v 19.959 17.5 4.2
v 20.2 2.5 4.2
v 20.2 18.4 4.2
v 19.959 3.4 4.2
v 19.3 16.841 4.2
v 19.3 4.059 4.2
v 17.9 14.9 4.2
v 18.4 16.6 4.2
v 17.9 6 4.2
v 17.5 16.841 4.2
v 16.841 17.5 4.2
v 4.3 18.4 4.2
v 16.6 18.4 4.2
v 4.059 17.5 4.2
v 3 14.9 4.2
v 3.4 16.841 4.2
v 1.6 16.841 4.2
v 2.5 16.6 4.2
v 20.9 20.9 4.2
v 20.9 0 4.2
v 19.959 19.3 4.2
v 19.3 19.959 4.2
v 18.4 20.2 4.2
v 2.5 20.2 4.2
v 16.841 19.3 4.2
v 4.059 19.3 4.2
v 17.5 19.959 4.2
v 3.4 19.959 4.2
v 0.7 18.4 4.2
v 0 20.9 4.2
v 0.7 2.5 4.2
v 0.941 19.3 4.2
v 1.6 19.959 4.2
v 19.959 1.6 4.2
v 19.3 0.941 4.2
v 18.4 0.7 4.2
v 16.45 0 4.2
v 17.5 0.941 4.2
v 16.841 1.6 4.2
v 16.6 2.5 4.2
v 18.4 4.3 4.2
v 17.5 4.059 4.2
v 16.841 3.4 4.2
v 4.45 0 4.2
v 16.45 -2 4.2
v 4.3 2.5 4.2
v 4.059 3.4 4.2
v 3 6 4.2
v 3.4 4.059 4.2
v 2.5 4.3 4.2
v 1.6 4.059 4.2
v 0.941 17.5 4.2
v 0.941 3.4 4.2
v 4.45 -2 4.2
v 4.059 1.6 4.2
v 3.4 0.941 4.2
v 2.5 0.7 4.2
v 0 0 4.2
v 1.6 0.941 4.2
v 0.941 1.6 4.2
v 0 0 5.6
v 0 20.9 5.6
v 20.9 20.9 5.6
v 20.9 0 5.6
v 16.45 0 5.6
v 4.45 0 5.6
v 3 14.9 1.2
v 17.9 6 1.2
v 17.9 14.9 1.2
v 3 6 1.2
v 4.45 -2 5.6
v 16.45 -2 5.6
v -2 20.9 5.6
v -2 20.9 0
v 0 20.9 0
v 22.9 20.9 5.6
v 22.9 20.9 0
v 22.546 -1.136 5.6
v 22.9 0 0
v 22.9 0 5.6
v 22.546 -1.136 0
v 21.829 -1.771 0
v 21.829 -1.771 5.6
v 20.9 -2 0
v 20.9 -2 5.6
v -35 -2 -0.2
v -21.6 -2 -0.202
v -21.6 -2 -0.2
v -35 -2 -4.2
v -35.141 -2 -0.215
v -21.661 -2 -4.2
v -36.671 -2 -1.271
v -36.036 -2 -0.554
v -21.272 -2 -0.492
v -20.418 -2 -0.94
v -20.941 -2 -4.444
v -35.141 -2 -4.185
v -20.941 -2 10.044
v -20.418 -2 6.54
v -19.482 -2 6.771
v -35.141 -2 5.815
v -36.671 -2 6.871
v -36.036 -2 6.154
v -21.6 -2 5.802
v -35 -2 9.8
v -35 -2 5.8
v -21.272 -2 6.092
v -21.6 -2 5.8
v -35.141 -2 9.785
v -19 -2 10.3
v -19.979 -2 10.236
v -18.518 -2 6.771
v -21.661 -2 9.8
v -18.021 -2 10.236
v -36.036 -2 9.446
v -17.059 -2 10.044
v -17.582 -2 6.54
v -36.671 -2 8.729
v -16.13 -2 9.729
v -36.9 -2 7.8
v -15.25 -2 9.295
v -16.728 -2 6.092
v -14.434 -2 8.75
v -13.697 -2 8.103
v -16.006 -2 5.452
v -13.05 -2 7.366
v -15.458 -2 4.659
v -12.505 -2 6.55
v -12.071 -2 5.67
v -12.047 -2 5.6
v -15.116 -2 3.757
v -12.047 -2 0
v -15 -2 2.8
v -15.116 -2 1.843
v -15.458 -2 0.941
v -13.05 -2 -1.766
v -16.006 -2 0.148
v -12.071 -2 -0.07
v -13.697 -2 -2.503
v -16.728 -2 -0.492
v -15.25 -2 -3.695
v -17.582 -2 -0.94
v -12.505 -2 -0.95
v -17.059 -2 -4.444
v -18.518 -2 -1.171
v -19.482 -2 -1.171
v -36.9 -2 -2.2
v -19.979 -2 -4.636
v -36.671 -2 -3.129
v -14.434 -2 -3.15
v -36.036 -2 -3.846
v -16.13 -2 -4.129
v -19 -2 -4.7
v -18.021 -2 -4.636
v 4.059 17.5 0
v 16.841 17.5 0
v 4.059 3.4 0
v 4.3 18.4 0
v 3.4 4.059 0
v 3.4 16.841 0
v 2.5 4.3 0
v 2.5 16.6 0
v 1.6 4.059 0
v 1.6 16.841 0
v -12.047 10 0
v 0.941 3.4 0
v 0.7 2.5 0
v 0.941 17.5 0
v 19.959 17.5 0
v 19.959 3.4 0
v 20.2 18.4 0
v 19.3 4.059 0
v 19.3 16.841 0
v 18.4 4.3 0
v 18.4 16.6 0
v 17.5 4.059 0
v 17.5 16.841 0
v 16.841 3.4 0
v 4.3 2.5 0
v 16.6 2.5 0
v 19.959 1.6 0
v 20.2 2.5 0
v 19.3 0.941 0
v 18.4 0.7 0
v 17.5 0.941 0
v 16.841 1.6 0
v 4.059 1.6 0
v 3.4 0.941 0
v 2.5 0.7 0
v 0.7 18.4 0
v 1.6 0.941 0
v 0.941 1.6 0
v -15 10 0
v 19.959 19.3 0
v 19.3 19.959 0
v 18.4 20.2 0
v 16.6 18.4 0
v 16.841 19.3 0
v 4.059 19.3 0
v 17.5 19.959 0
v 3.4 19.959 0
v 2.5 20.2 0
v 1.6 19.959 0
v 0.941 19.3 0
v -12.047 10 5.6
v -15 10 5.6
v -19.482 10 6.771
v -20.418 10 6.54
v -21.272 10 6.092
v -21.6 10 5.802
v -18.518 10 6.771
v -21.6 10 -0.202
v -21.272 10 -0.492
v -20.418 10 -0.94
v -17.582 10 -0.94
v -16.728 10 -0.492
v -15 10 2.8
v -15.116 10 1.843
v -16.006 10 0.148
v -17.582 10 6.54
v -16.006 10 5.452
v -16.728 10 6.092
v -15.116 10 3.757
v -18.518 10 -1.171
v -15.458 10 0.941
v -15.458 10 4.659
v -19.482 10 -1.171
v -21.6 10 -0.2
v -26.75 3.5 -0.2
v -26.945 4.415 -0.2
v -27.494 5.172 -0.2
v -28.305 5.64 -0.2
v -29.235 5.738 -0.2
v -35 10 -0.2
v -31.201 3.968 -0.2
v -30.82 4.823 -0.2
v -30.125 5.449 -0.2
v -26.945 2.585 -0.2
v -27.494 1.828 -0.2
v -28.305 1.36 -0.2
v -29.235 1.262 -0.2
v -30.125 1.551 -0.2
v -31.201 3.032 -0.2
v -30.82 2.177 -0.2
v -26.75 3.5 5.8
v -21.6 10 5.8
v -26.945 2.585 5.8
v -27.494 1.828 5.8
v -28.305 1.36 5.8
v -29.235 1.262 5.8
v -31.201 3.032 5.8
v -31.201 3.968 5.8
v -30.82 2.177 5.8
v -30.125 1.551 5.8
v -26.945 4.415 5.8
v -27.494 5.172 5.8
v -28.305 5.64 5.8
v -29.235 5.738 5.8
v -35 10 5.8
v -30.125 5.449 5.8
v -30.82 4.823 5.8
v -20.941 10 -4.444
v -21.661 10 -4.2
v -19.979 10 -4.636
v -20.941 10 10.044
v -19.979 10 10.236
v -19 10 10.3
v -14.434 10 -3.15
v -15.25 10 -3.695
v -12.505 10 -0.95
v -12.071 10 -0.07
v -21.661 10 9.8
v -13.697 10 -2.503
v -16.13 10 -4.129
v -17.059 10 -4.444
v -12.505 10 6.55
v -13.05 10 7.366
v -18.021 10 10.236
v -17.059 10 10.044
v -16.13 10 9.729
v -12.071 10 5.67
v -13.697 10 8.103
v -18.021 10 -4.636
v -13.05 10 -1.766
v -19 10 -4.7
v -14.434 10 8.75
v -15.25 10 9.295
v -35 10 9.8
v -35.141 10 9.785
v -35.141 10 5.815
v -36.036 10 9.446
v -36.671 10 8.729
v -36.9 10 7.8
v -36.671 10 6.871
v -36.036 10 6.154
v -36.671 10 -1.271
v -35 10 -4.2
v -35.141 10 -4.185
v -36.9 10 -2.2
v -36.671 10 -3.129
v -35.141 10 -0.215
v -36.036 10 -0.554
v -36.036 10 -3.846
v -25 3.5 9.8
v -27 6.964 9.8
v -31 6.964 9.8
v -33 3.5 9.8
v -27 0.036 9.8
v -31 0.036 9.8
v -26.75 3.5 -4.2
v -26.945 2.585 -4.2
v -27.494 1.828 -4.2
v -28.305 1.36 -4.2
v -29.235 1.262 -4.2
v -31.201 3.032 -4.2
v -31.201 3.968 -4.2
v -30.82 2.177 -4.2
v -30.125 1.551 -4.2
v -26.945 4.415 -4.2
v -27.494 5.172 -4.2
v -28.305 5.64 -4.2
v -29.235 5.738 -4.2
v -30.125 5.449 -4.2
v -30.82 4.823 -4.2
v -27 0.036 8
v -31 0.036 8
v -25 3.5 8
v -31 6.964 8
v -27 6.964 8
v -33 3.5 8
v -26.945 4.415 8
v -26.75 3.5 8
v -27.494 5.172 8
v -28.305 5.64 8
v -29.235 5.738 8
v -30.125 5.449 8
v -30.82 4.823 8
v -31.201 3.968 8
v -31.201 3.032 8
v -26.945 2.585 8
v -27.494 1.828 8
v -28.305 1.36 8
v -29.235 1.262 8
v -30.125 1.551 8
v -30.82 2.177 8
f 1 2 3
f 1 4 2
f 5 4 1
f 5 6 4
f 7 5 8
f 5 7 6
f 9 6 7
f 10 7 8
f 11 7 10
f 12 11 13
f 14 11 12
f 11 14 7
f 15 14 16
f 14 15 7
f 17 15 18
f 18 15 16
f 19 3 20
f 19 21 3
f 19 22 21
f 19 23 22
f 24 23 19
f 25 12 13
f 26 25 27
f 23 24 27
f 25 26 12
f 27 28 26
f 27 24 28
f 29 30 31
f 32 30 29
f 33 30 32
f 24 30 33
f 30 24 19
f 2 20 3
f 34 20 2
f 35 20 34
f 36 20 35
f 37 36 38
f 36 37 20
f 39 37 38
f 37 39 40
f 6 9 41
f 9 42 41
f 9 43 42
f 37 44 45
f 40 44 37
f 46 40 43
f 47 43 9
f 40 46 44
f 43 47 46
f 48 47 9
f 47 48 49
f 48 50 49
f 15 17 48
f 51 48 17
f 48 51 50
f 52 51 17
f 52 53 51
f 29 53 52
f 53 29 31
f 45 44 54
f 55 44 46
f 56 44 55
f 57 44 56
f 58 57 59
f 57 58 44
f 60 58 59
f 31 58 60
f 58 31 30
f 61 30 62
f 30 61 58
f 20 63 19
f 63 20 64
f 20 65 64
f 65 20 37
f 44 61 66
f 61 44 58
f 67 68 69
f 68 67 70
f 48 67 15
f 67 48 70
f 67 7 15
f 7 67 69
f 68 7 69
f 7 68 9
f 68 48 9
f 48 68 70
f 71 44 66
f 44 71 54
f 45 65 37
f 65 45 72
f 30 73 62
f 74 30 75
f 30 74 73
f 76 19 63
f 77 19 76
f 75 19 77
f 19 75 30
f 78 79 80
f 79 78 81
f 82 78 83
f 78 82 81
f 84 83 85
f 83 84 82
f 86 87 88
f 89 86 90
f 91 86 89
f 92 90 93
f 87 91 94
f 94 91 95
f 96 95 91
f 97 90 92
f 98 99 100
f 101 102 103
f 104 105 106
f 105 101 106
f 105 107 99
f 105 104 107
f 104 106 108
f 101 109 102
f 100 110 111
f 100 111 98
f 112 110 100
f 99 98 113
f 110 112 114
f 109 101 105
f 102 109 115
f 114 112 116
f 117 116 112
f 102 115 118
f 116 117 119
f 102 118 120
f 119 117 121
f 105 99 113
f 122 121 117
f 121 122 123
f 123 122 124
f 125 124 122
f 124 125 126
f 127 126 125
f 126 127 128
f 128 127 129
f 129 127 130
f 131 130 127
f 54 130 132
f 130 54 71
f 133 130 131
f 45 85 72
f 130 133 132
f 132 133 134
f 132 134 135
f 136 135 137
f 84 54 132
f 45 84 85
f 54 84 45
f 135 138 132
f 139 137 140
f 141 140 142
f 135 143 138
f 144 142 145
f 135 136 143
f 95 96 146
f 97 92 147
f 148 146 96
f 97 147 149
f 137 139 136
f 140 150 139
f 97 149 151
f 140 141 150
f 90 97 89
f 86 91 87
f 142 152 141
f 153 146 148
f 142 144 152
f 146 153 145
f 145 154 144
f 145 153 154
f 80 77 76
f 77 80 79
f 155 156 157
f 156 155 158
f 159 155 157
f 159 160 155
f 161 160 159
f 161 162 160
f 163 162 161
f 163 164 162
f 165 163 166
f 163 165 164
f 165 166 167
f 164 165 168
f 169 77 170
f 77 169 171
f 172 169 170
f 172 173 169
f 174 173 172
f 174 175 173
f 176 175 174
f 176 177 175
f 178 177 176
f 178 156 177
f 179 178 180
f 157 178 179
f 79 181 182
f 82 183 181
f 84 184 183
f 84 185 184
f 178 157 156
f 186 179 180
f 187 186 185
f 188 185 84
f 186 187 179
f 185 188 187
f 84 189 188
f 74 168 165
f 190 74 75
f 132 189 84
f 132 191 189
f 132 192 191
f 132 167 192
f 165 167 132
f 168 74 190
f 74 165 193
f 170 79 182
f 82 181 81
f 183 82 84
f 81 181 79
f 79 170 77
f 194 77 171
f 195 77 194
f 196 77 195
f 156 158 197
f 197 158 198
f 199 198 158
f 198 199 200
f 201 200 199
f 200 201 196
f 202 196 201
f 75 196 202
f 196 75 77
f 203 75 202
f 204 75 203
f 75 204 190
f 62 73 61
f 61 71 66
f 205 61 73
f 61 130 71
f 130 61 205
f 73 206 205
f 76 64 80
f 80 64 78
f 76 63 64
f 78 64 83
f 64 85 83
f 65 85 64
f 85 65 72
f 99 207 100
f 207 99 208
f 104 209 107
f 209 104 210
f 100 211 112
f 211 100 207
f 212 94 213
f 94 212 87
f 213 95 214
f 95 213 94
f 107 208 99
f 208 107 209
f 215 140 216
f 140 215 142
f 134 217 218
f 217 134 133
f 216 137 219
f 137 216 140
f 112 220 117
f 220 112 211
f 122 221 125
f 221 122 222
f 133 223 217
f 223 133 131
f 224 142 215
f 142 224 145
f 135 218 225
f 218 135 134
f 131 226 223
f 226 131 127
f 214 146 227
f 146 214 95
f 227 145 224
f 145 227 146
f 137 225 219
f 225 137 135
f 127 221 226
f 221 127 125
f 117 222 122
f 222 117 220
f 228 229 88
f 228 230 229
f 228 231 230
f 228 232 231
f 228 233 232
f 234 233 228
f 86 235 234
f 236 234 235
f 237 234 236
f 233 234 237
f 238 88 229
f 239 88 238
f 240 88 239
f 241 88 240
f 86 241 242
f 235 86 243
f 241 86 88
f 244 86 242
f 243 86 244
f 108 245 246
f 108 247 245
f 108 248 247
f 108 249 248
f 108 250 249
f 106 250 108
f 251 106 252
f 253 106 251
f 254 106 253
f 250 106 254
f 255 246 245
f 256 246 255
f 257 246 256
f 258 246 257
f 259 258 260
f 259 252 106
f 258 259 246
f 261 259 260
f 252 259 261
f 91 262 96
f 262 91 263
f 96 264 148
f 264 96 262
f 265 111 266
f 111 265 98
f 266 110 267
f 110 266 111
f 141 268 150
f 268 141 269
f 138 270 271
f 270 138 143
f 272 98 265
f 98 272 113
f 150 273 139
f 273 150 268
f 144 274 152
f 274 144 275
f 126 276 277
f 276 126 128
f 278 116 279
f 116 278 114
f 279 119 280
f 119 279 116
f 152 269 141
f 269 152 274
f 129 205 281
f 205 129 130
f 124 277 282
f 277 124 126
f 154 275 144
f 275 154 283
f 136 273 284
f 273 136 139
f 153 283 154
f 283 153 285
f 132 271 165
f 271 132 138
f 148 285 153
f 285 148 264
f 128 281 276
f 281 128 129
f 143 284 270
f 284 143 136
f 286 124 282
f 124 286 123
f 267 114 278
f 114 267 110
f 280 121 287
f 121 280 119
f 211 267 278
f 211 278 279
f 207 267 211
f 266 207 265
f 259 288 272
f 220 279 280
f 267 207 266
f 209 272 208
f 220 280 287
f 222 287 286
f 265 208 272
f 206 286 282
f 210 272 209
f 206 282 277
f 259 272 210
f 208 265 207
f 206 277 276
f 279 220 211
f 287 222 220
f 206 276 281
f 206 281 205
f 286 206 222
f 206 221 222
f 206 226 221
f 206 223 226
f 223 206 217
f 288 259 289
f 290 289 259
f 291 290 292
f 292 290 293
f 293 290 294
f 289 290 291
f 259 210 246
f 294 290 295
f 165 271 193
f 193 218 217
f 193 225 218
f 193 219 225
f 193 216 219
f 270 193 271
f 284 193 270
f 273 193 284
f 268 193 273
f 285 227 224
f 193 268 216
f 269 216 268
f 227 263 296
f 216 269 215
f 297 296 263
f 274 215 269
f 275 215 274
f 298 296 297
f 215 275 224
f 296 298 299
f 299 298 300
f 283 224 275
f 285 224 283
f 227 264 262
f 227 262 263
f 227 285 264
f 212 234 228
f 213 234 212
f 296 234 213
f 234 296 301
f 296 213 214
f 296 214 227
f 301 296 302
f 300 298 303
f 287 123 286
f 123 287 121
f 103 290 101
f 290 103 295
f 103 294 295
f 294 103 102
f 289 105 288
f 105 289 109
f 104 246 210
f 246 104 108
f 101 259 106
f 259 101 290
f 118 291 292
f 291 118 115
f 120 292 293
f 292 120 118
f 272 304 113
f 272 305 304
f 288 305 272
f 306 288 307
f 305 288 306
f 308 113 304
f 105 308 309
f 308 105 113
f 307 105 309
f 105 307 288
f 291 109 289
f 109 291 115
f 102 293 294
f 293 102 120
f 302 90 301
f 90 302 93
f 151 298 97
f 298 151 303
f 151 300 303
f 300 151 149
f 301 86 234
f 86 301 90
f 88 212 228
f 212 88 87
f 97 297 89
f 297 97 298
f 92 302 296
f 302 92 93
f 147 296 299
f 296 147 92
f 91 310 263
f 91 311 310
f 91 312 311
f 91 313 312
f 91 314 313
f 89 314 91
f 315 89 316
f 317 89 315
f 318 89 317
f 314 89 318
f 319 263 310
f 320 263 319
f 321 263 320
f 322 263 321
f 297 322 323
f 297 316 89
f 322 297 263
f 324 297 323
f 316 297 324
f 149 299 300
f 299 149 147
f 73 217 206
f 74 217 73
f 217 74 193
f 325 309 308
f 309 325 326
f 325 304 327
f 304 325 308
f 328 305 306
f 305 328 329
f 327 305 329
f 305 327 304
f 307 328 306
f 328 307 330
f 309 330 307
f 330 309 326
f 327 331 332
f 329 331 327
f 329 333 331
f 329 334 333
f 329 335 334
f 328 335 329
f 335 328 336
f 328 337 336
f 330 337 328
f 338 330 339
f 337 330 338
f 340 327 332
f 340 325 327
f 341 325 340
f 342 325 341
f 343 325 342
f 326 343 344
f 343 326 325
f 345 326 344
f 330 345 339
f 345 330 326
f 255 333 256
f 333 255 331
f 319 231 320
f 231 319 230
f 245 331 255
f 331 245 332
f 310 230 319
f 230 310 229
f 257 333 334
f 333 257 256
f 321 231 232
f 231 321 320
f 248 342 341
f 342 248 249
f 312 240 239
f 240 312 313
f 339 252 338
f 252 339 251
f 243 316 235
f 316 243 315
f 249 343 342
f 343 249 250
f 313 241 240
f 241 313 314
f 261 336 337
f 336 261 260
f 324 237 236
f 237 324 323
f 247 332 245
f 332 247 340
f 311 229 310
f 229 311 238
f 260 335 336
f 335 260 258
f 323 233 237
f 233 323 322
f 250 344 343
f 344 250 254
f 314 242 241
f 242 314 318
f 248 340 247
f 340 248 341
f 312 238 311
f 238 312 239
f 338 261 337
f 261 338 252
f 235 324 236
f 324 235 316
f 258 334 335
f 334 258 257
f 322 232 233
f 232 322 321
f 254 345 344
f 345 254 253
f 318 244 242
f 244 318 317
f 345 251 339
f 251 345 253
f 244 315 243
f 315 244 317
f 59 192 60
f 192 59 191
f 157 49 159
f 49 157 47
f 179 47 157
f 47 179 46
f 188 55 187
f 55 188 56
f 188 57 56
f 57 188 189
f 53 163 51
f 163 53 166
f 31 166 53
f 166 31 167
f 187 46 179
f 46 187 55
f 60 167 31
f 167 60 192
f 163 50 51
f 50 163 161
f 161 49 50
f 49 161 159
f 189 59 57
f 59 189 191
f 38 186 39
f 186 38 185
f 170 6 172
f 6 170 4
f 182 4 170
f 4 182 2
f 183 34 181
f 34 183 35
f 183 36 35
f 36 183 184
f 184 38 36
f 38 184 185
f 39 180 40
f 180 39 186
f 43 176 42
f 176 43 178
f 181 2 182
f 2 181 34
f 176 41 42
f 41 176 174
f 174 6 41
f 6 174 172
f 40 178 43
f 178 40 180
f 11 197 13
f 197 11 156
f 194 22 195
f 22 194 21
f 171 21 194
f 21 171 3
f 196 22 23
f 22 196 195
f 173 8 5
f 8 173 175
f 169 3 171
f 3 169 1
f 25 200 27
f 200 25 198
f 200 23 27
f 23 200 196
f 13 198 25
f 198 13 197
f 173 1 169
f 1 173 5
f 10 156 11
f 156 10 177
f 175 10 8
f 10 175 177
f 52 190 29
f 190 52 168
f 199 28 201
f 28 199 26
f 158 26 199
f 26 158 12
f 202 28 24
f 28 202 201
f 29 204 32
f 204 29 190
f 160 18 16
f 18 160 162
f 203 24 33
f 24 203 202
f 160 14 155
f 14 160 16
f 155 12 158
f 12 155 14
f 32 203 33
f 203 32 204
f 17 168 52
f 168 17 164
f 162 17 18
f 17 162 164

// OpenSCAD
// Minimum render angle
$fa = 5;
// Minimum render size
$fs = 1;


actualWidth = 20.5;
actualLength = 20.5;
pcbTolerance = 0.4;

baseWidth = actualWidth + pcbTolerance;
baseLength = actualLength + pcbTolerance;

cornerRadius = 2;
wallThickness = 2;

backReliefDepth = 3;
floorDepth = 1.2;
pcbThickness = 1.4;

baseThickness = backReliefDepth + floorDepth + pcbThickness;

backReliefWidth = baseWidth - 6;
backReliefLength = baseLength - 12;

cabletrapWidth = 12;

rodDiameter = 8;
neckThickness = 7;
neckOpeningWidth = 6;
neckDepth = 12;
neckDistance = 15;

armWidth = neckThickness - 3;

armDistance = 12;
distanceOffsetX = -1.4;

nutWallThickness = 1.6;
m4BoltDiameter = 4.5;

m3BoltDiameter = 3.6;
m3BoltOffset = 2.5;

componentDepth = 6;
lidThickness = componentDepth + 1.2;
componentWidth = 13;

// piece: main|lid|all
// orientation: print|view
render( piece = "body", orientation = "view" );

module render( piece = "main", orientation = "view" ) {
	if( piece == "lid" ) {

		if( orientation == "print" ) {
			rotate( [180, 0, 0] ) lid();
		} else {
			translate( [0, 0, baseThickness] )  lid();
		}

	} else if( piece == "all" ) {
		construction();
		translate( [0, 0, baseThickness] )  lid();
	} else {

		if( orientation == "print" ) {
			rotate( [90, 0, 0] ) construction();
		} else {
			construction();
		}

	}
}

module printOrientation( piece ) {
	if( piece == "lid" ) {
		lid();
	} else {
		construction();
	}
}

module lid() {
	difference()
	{
		{
			linear_extrude( height = lidThickness ) {
				offset( r = cornerRadius ) {
					offset( delta = (wallThickness - cornerRadius ) ) {
						square( size=[baseWidth, baseLength] );
					}
				}
			}
		}
		{
			translate( [0, 0, baseThickness] ) actuatorCutout();
			translate( [0, 0, baseThickness + 2] ) actuatorCutout();
			pcbBoltCutout();
			translate( [(baseWidth/2) - (componentWidth/2), -1 * wallThickness - 0.1, -0.1] ) cube( [componentWidth, baseLength + wallThickness + 0.2, componentDepth + 0.1] );
			smtCutout();
		}
	}
}

module smtCutout() {
	smtX = 6;
	smtY = 10;
	smtZ = 2;

	translate( [0, (baseLength/2) - (smtY/2), -0.1] ) {
		cube( [smtX, smtY, smtZ + 0.1] );
		translate( [baseWidth - smtX, 0, 0] ) cube( [smtX, smtY, smtZ + 0.1] );
	}
}

module construction() {
	difference() {
		{
			union() {
				base();
				rodConnector();
				neckConnector();
			}
		}
		{
			union()
			{
				m4BoltCutout();
				pcbBoltCutout();
			}
		}
	}
}

module m4BoltCutout() {
	translate( [-1 * (neckDistance + (neckDepth/2) + armWidth + (rodDiameter/2)), (neckThickness/2), neckOpeningWidth + pcbTolerance + nutWallThickness] )
	{
		nutTrap();
		translate( [0, 0, -15]) cylinder( d = m4BoltDiameter, h = 20 );
	}
}



module pcbBoltCutout() {
	translate( [0, 0, -1] ) {
		translate( [m3BoltOffset, m3BoltOffset, 0]) cylinder( d = m3BoltDiameter, h = 20 );
		translate( [baseWidth - m3BoltOffset, m3BoltOffset, 0]) cylinder( d = m3BoltDiameter, h = 20 );
		translate( [baseWidth - m3BoltOffset, baseWidth - m3BoltOffset, 0]) cylinder( d = m3BoltDiameter, h = 20 );
		translate( [m3BoltOffset, baseWidth - m3BoltOffset, 0]) cylinder( d = m3BoltDiameter, h = 20 );
	}
}


module neckConnector() {
	hull()
	{
		{
			translate( [-1 * neckDistance, -1 * wallThickness, 0] ) cube( [neckDistance, neckDepth, baseThickness] );
		}
		{
			translate( [-1 * wallThickness, 0, 0] ) cube( [wallThickness, baseLength, baseThickness] );
		}
	}
}


module rodConnector() {
	translate( [-1 * neckDistance - (rodDiameter/2), neckDepth - (1 * wallThickness), (baseThickness/2)] ) rotate( [0, 180, 0] ) rotate( [90, 0, 0] )
	{
		difference()
		{
			{
				cylinder( d = rodDiameter + neckThickness, h = neckDepth );
			}
			{
				union()
				{
					translate( [0, 0, -1] ) cylinder( d = rodDiameter, h = neckDepth + 2 );
					translate( [0, (-1 * (neckOpeningWidth/2)), -1] ) cube( [10, neckOpeningWidth, neckDepth + 2] );
				}
			}
		}

		translate( [(rodDiameter/2) + distanceOffsetX, -1 * neckThickness, 0] )
		{
			arm();
			translate( [0, neckOpeningWidth + armWidth, 0] )
			{
				arm();
			}
		}

	}
}

module base() {

	difference() {
		{
			union()
			{
				mainBase();
			}
		}
		{
			union()
			{
				translate( [0, 0, baseThickness] ) {
					pcbCutout();
					backReliefCutout();
					cableTrapExit();
					actuatorCutout();
				}

			}
		}
	}

}

module arm()
{
	
	
	hull()
	{
		{
			cube( [armDistance - distanceOffsetX, armWidth, neckDepth] );
		}
		{
			translate( [armDistance + (armWidth/2) + (distanceOffsetX/2), (armWidth/2), 0] ) cylinder( d = armWidth, h = neckDepth );
		}
	}
}


module actuatorCutout() {
	translate( [-1 * wallThickness - 0.1, baseLength, -1 * baseThickness - 0.1] ) {
		linear_extrude( height = baseThickness + 0.2 ) {
			square( size=[baseWidth + (wallThickness * 2) + 0.2, wallThickness + 0.1] );
		}
	}
}

module cableTrapExit() {
	translate( [(baseWidth/2) - (cabletrapWidth/2), -1 * wallThickness - 0.1, -1 * (pcbThickness)] ) {
		linear_extrude( height = pcbThickness + 0.1 ) {
			square( size=[cabletrapWidth, wallThickness + 0.2] );
		}
	}
}

module mainBase() {
	linear_extrude( height = baseThickness ) {
		offset( r = cornerRadius ) {
			offset( delta = (wallThickness - cornerRadius ) ) {
				square( size=[baseWidth, baseLength] );
			}
		}
	}
}

module pcbCutout() {
	translate( [0, 0, (-1 * pcbThickness)] ) {
		linear_extrude( height = (pcbThickness) + 0.1 ) {
			square( size=[baseWidth, baseLength + wallThickness + 0.1] );
		}
	}
}

module backReliefCutout() {
	translate( [(baseWidth/2) - (backReliefWidth/2), (baseLength/2) - (backReliefLength/2), (-1 * (pcbThickness + backReliefDepth))] ) {
		linear_extrude( height = backReliefDepth + 0.1 ) {
			square( size=[backReliefWidth, backReliefLength] );
		}
		
	}
}

module nutTrap()
{
	cylinder( h = 4.5, r = 4.0, $fn=6 );
}
